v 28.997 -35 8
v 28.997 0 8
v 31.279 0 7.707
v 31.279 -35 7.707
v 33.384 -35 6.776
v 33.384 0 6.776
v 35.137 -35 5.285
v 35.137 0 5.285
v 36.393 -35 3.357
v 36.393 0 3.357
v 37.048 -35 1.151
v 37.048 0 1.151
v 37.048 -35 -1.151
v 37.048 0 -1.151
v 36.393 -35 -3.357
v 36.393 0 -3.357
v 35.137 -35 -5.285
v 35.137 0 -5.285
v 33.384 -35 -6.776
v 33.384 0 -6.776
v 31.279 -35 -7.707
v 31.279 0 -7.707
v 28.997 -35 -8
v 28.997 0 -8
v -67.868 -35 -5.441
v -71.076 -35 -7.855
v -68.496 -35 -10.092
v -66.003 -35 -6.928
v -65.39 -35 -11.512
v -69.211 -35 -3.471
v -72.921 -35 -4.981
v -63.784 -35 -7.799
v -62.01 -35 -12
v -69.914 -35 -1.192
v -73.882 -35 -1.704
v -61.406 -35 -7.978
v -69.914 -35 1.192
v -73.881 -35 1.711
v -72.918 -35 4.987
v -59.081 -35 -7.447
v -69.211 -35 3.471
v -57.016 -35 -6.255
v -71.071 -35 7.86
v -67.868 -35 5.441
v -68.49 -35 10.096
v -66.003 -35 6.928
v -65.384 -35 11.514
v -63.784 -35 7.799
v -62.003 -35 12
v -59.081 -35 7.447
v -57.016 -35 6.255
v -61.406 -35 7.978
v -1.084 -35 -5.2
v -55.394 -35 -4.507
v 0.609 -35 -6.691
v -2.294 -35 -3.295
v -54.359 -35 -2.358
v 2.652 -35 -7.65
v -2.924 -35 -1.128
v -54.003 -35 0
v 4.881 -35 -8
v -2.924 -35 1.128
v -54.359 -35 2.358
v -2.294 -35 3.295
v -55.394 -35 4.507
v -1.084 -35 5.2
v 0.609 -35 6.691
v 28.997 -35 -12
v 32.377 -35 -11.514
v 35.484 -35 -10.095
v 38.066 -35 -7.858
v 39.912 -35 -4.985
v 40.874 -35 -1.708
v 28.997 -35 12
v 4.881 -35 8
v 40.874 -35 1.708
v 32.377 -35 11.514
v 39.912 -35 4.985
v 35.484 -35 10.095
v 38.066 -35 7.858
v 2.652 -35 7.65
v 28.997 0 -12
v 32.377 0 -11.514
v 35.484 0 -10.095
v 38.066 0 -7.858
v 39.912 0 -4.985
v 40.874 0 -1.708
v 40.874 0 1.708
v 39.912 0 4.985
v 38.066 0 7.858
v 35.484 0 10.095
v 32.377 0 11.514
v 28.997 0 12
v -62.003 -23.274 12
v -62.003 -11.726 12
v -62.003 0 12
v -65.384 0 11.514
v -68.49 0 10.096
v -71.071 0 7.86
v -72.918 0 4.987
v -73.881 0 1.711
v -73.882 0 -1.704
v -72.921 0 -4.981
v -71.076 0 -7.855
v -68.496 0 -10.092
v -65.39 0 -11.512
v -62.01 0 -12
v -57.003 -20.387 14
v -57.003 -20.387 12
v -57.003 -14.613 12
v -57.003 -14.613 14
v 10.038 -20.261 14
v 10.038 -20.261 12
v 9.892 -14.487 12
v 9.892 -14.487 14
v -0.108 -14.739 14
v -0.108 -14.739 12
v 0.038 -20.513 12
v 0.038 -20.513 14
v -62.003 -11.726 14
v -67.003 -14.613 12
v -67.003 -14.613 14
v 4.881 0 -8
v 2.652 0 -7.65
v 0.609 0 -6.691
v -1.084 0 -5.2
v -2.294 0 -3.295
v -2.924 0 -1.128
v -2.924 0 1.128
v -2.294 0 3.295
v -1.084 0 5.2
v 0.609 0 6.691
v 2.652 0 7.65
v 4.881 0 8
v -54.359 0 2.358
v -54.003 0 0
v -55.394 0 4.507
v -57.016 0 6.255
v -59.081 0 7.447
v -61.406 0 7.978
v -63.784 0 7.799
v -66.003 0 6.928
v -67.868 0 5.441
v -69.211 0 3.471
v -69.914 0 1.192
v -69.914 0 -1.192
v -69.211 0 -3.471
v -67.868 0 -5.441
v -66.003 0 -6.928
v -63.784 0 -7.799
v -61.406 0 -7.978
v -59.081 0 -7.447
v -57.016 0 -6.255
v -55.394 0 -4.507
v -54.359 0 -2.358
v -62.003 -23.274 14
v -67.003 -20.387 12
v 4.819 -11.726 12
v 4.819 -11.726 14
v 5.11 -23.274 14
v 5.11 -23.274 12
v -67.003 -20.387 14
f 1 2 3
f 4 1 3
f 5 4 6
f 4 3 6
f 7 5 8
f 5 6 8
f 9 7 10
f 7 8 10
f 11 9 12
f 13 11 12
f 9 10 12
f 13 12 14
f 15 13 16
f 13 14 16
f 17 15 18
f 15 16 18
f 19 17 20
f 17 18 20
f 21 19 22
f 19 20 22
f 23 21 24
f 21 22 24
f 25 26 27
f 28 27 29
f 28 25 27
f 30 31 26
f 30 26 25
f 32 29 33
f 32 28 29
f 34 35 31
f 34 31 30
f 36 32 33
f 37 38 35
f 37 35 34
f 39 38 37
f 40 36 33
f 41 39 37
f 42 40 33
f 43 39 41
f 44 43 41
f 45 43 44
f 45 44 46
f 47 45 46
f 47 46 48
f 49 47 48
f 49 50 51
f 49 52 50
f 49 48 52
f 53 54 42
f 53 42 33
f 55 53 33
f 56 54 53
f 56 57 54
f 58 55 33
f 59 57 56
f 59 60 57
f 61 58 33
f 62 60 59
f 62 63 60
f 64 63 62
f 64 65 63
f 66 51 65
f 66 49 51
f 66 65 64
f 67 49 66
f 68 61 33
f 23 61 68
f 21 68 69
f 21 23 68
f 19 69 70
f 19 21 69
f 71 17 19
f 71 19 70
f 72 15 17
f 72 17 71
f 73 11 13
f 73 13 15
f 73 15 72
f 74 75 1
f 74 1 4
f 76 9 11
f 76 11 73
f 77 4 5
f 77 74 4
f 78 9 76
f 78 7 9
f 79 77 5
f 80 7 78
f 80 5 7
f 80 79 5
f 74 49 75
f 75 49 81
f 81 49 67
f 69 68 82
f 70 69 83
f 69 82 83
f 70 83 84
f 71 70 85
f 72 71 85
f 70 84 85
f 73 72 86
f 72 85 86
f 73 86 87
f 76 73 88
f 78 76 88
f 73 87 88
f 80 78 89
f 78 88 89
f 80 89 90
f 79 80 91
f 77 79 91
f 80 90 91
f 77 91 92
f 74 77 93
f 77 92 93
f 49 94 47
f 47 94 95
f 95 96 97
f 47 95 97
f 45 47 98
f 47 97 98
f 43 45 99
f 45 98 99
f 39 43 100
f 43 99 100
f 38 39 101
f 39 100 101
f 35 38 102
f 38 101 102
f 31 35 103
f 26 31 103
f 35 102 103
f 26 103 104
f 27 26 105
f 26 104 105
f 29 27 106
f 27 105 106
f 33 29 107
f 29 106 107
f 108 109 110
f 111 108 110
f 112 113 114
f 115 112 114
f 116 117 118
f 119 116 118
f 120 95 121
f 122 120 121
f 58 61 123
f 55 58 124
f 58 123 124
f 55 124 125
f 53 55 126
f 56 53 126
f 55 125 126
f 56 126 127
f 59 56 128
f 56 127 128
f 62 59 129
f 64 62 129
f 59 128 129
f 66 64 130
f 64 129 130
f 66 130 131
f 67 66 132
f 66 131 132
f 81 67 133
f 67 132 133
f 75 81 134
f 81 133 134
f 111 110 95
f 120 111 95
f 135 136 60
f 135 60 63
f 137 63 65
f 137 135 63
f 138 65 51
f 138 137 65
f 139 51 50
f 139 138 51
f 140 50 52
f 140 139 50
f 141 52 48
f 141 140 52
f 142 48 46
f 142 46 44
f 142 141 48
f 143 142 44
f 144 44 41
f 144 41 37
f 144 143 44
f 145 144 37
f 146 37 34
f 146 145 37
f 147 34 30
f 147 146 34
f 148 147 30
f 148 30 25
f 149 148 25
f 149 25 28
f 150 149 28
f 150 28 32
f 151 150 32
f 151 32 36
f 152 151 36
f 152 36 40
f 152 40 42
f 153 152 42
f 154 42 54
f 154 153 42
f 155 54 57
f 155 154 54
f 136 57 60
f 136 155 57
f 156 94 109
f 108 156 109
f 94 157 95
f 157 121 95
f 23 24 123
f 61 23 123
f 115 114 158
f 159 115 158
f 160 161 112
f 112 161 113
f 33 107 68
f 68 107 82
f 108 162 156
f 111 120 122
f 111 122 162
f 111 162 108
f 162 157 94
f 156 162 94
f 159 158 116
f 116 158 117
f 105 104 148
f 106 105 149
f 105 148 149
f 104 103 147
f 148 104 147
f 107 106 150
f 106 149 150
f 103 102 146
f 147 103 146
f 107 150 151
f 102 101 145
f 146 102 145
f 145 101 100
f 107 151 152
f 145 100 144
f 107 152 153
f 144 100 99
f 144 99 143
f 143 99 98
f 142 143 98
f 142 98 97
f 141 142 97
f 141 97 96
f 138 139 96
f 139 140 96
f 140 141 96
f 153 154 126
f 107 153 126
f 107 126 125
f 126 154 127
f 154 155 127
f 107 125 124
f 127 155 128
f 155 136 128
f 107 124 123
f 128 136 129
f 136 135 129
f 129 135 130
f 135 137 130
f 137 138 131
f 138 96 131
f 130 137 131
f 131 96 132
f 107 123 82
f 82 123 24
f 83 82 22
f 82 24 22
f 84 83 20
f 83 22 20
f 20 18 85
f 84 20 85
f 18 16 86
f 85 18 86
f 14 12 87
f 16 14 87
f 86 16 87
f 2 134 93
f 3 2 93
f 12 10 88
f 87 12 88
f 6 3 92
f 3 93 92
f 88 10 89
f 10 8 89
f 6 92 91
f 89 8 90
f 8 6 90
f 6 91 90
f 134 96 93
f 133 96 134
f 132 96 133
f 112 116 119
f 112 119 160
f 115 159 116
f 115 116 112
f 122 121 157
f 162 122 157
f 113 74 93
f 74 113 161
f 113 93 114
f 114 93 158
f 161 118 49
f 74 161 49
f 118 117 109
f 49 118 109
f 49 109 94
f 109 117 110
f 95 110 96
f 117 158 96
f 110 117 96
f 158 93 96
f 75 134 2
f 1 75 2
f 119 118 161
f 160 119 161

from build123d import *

# Parameters (mm, degrees)
F0_R     = 8
F1_DEPTH = 35
F3_DEPTH = 2


with BuildPart() as f1:
    # F0 (on Front) → F1 (new body)
    with BuildSketch(Plane.XZ):
        with BuildLine():
            Line((-62.010019, -11.999998), (28.996555, -11.999998))
            ThreePointArc((28.996555, -11.999998), (40.996553, 1e-06), (28.996555, 12))
            Line((28.996555, 12), (-62.003448, 12))
            ThreePointArc((-62.003448, 12), (-74.003447, 0.003286), (-62.010019, -11.999998))
        make_face()
        with Locations((-62.003448, 0)):
            Circle(F0_R, mode=Mode.SUBTRACT)
        with BuildLine():
            ThreePointArc((4.880946, -8), (-3.004283, 0), (4.880946, 8))
            Line((4.880946, 8), (28.996555, 8))
            ThreePointArc((28.996555, 8), (37.131105, 0), (28.996555, -8))
            Line((28.996555, -8), (4.880946, -8))
        make_face(mode=Mode.SUBTRACT)
    extrude(amount=F1_DEPTH)

    # F2 (on face) → F3 (join)
    with BuildSketch(Plane.XY.offset(12)):
        Polygon((9.892042, -14.4872), (4.819268, -11.726497), (-0.107958, -14.739297), (0.03759, -20.5128), (5.110364, -23.273503), (10.03759, -20.260703), align=None)
        Polygon((-57.003448, -20.386751), (-57.003448, -14.613249), (-62.003448, -11.726497), (-67.003448, -14.613249), (-67.003448, -20.386751), (-62.003448, -23.273503), align=None)
    extrude(amount=F3_DEPTH)


solid = f1.part
